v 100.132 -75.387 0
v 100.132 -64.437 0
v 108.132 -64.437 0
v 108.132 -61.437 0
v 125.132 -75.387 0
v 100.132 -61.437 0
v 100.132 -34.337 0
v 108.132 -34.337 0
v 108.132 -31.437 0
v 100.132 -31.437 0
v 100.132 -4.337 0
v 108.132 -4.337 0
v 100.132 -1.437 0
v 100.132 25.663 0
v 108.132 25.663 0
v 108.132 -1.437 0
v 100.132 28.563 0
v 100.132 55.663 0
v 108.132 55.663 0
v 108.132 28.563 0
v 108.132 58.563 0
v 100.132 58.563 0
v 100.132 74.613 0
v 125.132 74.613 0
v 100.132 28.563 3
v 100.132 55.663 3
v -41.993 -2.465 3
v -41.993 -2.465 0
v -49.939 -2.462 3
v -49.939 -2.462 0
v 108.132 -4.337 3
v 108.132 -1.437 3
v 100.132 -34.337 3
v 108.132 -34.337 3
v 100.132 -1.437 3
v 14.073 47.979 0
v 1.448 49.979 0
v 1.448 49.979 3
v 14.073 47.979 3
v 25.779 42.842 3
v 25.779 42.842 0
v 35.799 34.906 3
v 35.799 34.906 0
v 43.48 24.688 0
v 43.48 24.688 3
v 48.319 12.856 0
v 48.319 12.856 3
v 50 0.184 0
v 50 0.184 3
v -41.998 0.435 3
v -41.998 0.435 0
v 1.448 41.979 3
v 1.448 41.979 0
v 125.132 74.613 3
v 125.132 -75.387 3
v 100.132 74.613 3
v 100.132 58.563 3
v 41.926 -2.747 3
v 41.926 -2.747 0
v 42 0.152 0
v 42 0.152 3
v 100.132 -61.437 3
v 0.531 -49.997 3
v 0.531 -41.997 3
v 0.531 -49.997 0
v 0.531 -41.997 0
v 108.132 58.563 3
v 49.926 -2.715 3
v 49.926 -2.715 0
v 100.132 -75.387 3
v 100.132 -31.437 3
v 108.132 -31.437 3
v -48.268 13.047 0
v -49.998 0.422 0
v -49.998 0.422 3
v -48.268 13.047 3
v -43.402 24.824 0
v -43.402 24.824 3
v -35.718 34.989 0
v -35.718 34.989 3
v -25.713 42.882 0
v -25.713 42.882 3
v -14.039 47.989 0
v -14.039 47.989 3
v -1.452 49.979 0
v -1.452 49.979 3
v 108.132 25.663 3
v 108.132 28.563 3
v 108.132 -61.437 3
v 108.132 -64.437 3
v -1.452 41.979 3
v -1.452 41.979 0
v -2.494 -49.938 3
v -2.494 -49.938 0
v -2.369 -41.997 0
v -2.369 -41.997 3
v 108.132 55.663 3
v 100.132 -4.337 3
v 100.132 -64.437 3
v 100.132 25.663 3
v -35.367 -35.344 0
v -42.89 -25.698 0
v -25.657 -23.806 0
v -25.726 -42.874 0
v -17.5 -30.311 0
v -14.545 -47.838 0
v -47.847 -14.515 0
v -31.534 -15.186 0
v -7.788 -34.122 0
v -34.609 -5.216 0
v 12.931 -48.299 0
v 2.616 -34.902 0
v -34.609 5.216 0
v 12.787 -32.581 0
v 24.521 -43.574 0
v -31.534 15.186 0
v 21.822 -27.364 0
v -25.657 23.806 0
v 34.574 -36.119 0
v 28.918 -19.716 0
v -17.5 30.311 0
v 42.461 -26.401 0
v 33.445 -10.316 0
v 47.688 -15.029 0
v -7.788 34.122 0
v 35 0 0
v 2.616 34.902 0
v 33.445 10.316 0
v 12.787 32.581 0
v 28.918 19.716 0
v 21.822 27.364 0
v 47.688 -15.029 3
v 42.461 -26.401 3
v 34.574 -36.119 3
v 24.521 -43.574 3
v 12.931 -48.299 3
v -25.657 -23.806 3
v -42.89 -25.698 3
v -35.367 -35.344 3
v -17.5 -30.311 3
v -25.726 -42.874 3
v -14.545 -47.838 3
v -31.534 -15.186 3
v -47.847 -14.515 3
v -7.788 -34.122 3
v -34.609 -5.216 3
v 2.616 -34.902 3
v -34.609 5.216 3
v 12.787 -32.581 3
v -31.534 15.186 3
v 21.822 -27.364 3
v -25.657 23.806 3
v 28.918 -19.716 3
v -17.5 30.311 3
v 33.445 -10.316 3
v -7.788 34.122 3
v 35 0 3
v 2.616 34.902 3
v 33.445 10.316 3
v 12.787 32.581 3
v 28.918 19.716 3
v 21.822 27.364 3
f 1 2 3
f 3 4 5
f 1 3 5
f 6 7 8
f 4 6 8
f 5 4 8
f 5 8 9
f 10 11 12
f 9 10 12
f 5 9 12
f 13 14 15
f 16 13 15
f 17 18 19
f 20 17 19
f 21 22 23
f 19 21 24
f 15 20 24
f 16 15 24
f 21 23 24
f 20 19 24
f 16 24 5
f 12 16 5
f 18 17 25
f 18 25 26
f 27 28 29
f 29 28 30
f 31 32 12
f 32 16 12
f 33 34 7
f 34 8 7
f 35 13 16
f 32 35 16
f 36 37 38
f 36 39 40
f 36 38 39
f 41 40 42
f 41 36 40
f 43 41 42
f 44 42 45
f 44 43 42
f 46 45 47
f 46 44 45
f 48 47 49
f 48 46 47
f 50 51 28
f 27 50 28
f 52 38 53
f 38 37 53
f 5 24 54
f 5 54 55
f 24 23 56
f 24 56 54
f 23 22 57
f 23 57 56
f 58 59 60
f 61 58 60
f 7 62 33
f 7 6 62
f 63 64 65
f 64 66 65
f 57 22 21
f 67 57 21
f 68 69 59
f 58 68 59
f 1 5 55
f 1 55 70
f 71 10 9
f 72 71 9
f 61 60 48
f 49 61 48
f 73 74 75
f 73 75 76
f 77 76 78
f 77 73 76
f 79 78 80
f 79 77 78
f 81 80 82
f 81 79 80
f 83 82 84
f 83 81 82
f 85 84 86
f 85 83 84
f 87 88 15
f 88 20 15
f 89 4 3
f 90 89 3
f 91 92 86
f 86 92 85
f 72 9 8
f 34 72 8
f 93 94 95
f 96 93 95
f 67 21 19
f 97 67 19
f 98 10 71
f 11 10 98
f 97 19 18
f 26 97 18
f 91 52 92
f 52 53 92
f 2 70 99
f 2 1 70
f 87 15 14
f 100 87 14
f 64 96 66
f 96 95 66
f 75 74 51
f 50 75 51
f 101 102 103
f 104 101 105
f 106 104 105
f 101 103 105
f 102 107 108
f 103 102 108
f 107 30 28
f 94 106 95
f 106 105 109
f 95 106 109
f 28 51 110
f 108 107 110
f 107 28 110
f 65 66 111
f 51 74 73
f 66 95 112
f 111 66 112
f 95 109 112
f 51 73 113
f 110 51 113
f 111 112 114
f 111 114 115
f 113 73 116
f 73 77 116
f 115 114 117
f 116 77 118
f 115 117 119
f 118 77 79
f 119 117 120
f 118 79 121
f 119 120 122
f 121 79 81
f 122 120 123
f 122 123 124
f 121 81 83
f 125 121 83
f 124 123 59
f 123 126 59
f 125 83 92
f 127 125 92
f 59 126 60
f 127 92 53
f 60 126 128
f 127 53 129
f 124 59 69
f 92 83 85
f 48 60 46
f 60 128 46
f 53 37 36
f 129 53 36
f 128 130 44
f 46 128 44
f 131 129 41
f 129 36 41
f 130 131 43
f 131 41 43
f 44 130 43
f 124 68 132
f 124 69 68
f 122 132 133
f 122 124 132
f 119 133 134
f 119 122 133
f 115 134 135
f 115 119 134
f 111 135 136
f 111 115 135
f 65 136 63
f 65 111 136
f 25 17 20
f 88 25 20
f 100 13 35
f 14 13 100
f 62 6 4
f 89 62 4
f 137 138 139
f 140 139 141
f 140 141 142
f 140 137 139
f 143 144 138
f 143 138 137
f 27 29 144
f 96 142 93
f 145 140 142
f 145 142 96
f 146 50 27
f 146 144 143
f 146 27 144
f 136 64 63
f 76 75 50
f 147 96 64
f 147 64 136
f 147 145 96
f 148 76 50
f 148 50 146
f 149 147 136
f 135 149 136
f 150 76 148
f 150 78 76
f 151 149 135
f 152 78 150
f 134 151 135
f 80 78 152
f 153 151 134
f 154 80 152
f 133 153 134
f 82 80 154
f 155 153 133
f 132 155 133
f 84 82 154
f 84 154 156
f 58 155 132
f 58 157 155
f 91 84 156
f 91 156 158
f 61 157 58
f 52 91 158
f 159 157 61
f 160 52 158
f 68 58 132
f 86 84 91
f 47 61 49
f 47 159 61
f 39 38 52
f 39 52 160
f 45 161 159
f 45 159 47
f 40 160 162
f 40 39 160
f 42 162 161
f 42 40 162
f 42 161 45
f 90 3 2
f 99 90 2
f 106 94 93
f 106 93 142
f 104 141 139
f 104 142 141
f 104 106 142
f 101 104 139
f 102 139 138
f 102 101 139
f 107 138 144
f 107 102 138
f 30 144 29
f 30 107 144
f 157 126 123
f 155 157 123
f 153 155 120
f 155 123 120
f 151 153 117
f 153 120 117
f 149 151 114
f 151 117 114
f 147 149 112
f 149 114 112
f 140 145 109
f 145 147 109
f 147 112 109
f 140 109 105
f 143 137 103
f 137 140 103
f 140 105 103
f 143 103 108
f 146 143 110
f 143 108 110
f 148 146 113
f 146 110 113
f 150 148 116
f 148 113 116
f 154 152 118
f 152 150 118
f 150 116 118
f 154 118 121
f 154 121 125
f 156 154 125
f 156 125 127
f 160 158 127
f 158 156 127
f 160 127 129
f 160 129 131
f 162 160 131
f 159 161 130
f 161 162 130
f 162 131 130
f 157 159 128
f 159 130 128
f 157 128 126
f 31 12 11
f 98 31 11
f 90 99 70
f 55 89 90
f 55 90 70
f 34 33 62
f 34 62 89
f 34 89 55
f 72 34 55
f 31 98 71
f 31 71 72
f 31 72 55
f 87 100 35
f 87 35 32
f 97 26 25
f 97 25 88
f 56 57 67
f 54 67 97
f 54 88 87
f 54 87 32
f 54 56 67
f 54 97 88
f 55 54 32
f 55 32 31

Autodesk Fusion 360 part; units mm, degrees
sketch "Sketch1" plane through (0, 0, 0) normal (0, 0, 1) x (1, 0, 0)
  line L0 (1.4478, 49.979) -> (1.4478, 41.979)
  line L1 (1.4478, 41.979) -> (-1.4522, 41.979)
  line L2 (-1.4522, 41.979) -> (-1.4522, 49.9789)
  line L3 (-49.9982, 0.4218) -> (-41.9982, 0.4353)
  line L4 (-41.9933, -2.4646) -> (-49.9393, -2.462)
  line L5 (-41.9982, 0.4353) -> (-41.9933, -2.4646)
  line L6 (-2.494, -49.9378) -> (-2.3689, -41.9972)
  line L7 (0.5311, -41.9972) -> (0.5311, -49.9972)
  line L8 (-2.3689, -41.9972) -> (0.5311, -41.9972)
  line L9 (49.9262, -2.7151) -> (41.9262, -2.7471)
  line L10 (41.9997, 0.1519) -> (49.9997, 0.184)
  line L11 (41.9262, -2.7471) -> (41.9997, 0.1519)
  circle A0 centre (0, 0) radius 35
  line L12 (100.1319, 74.6129) -> (125.1319, 74.6129)
  line L13 (125.1319, 74.6129) -> (125.1319, -75.3871)
  line L14 (125.1319, -75.3871) -> (100.1319, -75.3871)
  line L15 (100.1319, -61.4369) -> (108.1319, -61.4369)
  line L16 (108.1319, -61.4369) -> (108.1319, -64.4369)
  line L17 (108.1319, -64.4369) -> (100.1319, -64.4369)
  line L18 (100.1319, -31.4369) -> (108.1319, -31.4369)
  line L19 (108.1319, -34.3369) -> (100.1319, -34.3369)
  line L20 (108.1319, -31.4369) -> (108.1319, -34.3369)
  line L21 (100.1319, -1.4369) -> (108.1319, -1.4369)
  line L22 (108.1319, -4.3369) -> (100.1319, -4.3369)
  line L23 (108.1319, -1.4369) -> (108.1319, -4.3369)
  line L24 (100.1319, 28.5631) -> (108.1319, 28.5631)
  line L25 (108.1319, 25.6631) -> (100.1319, 25.6631)
  line L26 (108.1319, 28.5631) -> (108.1319, 25.6631)
  line L27 (100.1319, 58.5631) -> (108.1319, 58.5631)
  line L28 (108.1319, 55.6631) -> (100.1319, 55.6631)
  line L29 (108.1319, 58.5631) -> (108.1319, 55.6631)
  arc A1 (49.9997, 0.184) -> (1.4478, 49.979) centre (0, 0) ccw
  arc A2 (-1.4522, 49.9789) -> (-49.9982, 0.4218) centre (0, 0) ccw
  arc A3 (-49.9393, -2.462) -> (-2.494, -49.9378) centre (0, 0) ccw
  arc A4 (0.5311, -49.9972) -> (49.9262, -2.7151) centre (0, 0) ccw
  line L30 (100.1319, 58.5631) -> (100.1319, 74.6129)
  line L31 (100.1319, 28.5631) -> (100.1319, 55.6631)
  line L32 (100.1319, -1.4369) -> (100.1319, 25.6631)
  line L33 (100.1319, -31.4369) -> (100.1319, -4.3369)
  line L34 (100.1319, -75.3871) -> (100.1319, -64.4369)
  line L35 (100.1319, -61.4369) -> (100.1319, -34.3369)
  dimension "d6" = 70
  dimension "d7" = 25
  dimension "d8" = 150
  dimension "d9" = 8
  dimension "d10" = 3
  dimension "d15" = 100
  dimension "d23" = 2.9
  dimension "d24" = 8
  dimension "d25" = 2.9
  dimension "d26" = 8
  dimension "d27" = 8
  dimension "d28" = 2.9
  dimension "d29" = 8
  dimension "d30" = 2.9
  dimension "d31" = 8
  dimension "d32" = 2.9
  dimension "d33" = 8
  dimension "d34" = 2.9
  dimension "d35" = 8
  dimension "d36" = 2.9
  dimension "d37" = 8
  dimension "d38" = 2.9
  dimension "d39" = 8
  dimension "d42" = 15
extrude "Extrude1" add sketch "Sketch1" along normal blind 3 makes body 1 at (-41.4923, -7.5131, 0) makes body 2 at (119.4652, -0.7371, 0)
equation "d6 = small_circle"
equation "d7 = rec_width"
equation "d8 = rec_height"
equation "d15 = big_circle"
equation "kerf = 0.1 mm"
equation "big_circle = 100 mm"
equation "small_circle = 70 mm"
equation "slot_height = 8 mm"
equation "material_thickness = 3 mm"
equation "slot_width = material_thickness - kerf"
equation "d23 = slot_width"
equation "d24 = slot_height"
equation "d25 = slot_width"
equation "d26 = slot_height"
equation "d27 = slot_height"
equation "d28 = slot_width"
equation "d29 = slot_height"
equation "d30 = slot_width"
equation "d31 = slot_height"
equation "d32 = slot_width"
equation "d33 = slot_height"
equation "d34 = slot_width"
equation "d35 = slot_height"
equation "d36 = slot_width"
equation "d37 = slot_height"
equation "d38 = slot_width"
equation "rec_height = 150 mm"
equation "rec_width = 25 mm"
